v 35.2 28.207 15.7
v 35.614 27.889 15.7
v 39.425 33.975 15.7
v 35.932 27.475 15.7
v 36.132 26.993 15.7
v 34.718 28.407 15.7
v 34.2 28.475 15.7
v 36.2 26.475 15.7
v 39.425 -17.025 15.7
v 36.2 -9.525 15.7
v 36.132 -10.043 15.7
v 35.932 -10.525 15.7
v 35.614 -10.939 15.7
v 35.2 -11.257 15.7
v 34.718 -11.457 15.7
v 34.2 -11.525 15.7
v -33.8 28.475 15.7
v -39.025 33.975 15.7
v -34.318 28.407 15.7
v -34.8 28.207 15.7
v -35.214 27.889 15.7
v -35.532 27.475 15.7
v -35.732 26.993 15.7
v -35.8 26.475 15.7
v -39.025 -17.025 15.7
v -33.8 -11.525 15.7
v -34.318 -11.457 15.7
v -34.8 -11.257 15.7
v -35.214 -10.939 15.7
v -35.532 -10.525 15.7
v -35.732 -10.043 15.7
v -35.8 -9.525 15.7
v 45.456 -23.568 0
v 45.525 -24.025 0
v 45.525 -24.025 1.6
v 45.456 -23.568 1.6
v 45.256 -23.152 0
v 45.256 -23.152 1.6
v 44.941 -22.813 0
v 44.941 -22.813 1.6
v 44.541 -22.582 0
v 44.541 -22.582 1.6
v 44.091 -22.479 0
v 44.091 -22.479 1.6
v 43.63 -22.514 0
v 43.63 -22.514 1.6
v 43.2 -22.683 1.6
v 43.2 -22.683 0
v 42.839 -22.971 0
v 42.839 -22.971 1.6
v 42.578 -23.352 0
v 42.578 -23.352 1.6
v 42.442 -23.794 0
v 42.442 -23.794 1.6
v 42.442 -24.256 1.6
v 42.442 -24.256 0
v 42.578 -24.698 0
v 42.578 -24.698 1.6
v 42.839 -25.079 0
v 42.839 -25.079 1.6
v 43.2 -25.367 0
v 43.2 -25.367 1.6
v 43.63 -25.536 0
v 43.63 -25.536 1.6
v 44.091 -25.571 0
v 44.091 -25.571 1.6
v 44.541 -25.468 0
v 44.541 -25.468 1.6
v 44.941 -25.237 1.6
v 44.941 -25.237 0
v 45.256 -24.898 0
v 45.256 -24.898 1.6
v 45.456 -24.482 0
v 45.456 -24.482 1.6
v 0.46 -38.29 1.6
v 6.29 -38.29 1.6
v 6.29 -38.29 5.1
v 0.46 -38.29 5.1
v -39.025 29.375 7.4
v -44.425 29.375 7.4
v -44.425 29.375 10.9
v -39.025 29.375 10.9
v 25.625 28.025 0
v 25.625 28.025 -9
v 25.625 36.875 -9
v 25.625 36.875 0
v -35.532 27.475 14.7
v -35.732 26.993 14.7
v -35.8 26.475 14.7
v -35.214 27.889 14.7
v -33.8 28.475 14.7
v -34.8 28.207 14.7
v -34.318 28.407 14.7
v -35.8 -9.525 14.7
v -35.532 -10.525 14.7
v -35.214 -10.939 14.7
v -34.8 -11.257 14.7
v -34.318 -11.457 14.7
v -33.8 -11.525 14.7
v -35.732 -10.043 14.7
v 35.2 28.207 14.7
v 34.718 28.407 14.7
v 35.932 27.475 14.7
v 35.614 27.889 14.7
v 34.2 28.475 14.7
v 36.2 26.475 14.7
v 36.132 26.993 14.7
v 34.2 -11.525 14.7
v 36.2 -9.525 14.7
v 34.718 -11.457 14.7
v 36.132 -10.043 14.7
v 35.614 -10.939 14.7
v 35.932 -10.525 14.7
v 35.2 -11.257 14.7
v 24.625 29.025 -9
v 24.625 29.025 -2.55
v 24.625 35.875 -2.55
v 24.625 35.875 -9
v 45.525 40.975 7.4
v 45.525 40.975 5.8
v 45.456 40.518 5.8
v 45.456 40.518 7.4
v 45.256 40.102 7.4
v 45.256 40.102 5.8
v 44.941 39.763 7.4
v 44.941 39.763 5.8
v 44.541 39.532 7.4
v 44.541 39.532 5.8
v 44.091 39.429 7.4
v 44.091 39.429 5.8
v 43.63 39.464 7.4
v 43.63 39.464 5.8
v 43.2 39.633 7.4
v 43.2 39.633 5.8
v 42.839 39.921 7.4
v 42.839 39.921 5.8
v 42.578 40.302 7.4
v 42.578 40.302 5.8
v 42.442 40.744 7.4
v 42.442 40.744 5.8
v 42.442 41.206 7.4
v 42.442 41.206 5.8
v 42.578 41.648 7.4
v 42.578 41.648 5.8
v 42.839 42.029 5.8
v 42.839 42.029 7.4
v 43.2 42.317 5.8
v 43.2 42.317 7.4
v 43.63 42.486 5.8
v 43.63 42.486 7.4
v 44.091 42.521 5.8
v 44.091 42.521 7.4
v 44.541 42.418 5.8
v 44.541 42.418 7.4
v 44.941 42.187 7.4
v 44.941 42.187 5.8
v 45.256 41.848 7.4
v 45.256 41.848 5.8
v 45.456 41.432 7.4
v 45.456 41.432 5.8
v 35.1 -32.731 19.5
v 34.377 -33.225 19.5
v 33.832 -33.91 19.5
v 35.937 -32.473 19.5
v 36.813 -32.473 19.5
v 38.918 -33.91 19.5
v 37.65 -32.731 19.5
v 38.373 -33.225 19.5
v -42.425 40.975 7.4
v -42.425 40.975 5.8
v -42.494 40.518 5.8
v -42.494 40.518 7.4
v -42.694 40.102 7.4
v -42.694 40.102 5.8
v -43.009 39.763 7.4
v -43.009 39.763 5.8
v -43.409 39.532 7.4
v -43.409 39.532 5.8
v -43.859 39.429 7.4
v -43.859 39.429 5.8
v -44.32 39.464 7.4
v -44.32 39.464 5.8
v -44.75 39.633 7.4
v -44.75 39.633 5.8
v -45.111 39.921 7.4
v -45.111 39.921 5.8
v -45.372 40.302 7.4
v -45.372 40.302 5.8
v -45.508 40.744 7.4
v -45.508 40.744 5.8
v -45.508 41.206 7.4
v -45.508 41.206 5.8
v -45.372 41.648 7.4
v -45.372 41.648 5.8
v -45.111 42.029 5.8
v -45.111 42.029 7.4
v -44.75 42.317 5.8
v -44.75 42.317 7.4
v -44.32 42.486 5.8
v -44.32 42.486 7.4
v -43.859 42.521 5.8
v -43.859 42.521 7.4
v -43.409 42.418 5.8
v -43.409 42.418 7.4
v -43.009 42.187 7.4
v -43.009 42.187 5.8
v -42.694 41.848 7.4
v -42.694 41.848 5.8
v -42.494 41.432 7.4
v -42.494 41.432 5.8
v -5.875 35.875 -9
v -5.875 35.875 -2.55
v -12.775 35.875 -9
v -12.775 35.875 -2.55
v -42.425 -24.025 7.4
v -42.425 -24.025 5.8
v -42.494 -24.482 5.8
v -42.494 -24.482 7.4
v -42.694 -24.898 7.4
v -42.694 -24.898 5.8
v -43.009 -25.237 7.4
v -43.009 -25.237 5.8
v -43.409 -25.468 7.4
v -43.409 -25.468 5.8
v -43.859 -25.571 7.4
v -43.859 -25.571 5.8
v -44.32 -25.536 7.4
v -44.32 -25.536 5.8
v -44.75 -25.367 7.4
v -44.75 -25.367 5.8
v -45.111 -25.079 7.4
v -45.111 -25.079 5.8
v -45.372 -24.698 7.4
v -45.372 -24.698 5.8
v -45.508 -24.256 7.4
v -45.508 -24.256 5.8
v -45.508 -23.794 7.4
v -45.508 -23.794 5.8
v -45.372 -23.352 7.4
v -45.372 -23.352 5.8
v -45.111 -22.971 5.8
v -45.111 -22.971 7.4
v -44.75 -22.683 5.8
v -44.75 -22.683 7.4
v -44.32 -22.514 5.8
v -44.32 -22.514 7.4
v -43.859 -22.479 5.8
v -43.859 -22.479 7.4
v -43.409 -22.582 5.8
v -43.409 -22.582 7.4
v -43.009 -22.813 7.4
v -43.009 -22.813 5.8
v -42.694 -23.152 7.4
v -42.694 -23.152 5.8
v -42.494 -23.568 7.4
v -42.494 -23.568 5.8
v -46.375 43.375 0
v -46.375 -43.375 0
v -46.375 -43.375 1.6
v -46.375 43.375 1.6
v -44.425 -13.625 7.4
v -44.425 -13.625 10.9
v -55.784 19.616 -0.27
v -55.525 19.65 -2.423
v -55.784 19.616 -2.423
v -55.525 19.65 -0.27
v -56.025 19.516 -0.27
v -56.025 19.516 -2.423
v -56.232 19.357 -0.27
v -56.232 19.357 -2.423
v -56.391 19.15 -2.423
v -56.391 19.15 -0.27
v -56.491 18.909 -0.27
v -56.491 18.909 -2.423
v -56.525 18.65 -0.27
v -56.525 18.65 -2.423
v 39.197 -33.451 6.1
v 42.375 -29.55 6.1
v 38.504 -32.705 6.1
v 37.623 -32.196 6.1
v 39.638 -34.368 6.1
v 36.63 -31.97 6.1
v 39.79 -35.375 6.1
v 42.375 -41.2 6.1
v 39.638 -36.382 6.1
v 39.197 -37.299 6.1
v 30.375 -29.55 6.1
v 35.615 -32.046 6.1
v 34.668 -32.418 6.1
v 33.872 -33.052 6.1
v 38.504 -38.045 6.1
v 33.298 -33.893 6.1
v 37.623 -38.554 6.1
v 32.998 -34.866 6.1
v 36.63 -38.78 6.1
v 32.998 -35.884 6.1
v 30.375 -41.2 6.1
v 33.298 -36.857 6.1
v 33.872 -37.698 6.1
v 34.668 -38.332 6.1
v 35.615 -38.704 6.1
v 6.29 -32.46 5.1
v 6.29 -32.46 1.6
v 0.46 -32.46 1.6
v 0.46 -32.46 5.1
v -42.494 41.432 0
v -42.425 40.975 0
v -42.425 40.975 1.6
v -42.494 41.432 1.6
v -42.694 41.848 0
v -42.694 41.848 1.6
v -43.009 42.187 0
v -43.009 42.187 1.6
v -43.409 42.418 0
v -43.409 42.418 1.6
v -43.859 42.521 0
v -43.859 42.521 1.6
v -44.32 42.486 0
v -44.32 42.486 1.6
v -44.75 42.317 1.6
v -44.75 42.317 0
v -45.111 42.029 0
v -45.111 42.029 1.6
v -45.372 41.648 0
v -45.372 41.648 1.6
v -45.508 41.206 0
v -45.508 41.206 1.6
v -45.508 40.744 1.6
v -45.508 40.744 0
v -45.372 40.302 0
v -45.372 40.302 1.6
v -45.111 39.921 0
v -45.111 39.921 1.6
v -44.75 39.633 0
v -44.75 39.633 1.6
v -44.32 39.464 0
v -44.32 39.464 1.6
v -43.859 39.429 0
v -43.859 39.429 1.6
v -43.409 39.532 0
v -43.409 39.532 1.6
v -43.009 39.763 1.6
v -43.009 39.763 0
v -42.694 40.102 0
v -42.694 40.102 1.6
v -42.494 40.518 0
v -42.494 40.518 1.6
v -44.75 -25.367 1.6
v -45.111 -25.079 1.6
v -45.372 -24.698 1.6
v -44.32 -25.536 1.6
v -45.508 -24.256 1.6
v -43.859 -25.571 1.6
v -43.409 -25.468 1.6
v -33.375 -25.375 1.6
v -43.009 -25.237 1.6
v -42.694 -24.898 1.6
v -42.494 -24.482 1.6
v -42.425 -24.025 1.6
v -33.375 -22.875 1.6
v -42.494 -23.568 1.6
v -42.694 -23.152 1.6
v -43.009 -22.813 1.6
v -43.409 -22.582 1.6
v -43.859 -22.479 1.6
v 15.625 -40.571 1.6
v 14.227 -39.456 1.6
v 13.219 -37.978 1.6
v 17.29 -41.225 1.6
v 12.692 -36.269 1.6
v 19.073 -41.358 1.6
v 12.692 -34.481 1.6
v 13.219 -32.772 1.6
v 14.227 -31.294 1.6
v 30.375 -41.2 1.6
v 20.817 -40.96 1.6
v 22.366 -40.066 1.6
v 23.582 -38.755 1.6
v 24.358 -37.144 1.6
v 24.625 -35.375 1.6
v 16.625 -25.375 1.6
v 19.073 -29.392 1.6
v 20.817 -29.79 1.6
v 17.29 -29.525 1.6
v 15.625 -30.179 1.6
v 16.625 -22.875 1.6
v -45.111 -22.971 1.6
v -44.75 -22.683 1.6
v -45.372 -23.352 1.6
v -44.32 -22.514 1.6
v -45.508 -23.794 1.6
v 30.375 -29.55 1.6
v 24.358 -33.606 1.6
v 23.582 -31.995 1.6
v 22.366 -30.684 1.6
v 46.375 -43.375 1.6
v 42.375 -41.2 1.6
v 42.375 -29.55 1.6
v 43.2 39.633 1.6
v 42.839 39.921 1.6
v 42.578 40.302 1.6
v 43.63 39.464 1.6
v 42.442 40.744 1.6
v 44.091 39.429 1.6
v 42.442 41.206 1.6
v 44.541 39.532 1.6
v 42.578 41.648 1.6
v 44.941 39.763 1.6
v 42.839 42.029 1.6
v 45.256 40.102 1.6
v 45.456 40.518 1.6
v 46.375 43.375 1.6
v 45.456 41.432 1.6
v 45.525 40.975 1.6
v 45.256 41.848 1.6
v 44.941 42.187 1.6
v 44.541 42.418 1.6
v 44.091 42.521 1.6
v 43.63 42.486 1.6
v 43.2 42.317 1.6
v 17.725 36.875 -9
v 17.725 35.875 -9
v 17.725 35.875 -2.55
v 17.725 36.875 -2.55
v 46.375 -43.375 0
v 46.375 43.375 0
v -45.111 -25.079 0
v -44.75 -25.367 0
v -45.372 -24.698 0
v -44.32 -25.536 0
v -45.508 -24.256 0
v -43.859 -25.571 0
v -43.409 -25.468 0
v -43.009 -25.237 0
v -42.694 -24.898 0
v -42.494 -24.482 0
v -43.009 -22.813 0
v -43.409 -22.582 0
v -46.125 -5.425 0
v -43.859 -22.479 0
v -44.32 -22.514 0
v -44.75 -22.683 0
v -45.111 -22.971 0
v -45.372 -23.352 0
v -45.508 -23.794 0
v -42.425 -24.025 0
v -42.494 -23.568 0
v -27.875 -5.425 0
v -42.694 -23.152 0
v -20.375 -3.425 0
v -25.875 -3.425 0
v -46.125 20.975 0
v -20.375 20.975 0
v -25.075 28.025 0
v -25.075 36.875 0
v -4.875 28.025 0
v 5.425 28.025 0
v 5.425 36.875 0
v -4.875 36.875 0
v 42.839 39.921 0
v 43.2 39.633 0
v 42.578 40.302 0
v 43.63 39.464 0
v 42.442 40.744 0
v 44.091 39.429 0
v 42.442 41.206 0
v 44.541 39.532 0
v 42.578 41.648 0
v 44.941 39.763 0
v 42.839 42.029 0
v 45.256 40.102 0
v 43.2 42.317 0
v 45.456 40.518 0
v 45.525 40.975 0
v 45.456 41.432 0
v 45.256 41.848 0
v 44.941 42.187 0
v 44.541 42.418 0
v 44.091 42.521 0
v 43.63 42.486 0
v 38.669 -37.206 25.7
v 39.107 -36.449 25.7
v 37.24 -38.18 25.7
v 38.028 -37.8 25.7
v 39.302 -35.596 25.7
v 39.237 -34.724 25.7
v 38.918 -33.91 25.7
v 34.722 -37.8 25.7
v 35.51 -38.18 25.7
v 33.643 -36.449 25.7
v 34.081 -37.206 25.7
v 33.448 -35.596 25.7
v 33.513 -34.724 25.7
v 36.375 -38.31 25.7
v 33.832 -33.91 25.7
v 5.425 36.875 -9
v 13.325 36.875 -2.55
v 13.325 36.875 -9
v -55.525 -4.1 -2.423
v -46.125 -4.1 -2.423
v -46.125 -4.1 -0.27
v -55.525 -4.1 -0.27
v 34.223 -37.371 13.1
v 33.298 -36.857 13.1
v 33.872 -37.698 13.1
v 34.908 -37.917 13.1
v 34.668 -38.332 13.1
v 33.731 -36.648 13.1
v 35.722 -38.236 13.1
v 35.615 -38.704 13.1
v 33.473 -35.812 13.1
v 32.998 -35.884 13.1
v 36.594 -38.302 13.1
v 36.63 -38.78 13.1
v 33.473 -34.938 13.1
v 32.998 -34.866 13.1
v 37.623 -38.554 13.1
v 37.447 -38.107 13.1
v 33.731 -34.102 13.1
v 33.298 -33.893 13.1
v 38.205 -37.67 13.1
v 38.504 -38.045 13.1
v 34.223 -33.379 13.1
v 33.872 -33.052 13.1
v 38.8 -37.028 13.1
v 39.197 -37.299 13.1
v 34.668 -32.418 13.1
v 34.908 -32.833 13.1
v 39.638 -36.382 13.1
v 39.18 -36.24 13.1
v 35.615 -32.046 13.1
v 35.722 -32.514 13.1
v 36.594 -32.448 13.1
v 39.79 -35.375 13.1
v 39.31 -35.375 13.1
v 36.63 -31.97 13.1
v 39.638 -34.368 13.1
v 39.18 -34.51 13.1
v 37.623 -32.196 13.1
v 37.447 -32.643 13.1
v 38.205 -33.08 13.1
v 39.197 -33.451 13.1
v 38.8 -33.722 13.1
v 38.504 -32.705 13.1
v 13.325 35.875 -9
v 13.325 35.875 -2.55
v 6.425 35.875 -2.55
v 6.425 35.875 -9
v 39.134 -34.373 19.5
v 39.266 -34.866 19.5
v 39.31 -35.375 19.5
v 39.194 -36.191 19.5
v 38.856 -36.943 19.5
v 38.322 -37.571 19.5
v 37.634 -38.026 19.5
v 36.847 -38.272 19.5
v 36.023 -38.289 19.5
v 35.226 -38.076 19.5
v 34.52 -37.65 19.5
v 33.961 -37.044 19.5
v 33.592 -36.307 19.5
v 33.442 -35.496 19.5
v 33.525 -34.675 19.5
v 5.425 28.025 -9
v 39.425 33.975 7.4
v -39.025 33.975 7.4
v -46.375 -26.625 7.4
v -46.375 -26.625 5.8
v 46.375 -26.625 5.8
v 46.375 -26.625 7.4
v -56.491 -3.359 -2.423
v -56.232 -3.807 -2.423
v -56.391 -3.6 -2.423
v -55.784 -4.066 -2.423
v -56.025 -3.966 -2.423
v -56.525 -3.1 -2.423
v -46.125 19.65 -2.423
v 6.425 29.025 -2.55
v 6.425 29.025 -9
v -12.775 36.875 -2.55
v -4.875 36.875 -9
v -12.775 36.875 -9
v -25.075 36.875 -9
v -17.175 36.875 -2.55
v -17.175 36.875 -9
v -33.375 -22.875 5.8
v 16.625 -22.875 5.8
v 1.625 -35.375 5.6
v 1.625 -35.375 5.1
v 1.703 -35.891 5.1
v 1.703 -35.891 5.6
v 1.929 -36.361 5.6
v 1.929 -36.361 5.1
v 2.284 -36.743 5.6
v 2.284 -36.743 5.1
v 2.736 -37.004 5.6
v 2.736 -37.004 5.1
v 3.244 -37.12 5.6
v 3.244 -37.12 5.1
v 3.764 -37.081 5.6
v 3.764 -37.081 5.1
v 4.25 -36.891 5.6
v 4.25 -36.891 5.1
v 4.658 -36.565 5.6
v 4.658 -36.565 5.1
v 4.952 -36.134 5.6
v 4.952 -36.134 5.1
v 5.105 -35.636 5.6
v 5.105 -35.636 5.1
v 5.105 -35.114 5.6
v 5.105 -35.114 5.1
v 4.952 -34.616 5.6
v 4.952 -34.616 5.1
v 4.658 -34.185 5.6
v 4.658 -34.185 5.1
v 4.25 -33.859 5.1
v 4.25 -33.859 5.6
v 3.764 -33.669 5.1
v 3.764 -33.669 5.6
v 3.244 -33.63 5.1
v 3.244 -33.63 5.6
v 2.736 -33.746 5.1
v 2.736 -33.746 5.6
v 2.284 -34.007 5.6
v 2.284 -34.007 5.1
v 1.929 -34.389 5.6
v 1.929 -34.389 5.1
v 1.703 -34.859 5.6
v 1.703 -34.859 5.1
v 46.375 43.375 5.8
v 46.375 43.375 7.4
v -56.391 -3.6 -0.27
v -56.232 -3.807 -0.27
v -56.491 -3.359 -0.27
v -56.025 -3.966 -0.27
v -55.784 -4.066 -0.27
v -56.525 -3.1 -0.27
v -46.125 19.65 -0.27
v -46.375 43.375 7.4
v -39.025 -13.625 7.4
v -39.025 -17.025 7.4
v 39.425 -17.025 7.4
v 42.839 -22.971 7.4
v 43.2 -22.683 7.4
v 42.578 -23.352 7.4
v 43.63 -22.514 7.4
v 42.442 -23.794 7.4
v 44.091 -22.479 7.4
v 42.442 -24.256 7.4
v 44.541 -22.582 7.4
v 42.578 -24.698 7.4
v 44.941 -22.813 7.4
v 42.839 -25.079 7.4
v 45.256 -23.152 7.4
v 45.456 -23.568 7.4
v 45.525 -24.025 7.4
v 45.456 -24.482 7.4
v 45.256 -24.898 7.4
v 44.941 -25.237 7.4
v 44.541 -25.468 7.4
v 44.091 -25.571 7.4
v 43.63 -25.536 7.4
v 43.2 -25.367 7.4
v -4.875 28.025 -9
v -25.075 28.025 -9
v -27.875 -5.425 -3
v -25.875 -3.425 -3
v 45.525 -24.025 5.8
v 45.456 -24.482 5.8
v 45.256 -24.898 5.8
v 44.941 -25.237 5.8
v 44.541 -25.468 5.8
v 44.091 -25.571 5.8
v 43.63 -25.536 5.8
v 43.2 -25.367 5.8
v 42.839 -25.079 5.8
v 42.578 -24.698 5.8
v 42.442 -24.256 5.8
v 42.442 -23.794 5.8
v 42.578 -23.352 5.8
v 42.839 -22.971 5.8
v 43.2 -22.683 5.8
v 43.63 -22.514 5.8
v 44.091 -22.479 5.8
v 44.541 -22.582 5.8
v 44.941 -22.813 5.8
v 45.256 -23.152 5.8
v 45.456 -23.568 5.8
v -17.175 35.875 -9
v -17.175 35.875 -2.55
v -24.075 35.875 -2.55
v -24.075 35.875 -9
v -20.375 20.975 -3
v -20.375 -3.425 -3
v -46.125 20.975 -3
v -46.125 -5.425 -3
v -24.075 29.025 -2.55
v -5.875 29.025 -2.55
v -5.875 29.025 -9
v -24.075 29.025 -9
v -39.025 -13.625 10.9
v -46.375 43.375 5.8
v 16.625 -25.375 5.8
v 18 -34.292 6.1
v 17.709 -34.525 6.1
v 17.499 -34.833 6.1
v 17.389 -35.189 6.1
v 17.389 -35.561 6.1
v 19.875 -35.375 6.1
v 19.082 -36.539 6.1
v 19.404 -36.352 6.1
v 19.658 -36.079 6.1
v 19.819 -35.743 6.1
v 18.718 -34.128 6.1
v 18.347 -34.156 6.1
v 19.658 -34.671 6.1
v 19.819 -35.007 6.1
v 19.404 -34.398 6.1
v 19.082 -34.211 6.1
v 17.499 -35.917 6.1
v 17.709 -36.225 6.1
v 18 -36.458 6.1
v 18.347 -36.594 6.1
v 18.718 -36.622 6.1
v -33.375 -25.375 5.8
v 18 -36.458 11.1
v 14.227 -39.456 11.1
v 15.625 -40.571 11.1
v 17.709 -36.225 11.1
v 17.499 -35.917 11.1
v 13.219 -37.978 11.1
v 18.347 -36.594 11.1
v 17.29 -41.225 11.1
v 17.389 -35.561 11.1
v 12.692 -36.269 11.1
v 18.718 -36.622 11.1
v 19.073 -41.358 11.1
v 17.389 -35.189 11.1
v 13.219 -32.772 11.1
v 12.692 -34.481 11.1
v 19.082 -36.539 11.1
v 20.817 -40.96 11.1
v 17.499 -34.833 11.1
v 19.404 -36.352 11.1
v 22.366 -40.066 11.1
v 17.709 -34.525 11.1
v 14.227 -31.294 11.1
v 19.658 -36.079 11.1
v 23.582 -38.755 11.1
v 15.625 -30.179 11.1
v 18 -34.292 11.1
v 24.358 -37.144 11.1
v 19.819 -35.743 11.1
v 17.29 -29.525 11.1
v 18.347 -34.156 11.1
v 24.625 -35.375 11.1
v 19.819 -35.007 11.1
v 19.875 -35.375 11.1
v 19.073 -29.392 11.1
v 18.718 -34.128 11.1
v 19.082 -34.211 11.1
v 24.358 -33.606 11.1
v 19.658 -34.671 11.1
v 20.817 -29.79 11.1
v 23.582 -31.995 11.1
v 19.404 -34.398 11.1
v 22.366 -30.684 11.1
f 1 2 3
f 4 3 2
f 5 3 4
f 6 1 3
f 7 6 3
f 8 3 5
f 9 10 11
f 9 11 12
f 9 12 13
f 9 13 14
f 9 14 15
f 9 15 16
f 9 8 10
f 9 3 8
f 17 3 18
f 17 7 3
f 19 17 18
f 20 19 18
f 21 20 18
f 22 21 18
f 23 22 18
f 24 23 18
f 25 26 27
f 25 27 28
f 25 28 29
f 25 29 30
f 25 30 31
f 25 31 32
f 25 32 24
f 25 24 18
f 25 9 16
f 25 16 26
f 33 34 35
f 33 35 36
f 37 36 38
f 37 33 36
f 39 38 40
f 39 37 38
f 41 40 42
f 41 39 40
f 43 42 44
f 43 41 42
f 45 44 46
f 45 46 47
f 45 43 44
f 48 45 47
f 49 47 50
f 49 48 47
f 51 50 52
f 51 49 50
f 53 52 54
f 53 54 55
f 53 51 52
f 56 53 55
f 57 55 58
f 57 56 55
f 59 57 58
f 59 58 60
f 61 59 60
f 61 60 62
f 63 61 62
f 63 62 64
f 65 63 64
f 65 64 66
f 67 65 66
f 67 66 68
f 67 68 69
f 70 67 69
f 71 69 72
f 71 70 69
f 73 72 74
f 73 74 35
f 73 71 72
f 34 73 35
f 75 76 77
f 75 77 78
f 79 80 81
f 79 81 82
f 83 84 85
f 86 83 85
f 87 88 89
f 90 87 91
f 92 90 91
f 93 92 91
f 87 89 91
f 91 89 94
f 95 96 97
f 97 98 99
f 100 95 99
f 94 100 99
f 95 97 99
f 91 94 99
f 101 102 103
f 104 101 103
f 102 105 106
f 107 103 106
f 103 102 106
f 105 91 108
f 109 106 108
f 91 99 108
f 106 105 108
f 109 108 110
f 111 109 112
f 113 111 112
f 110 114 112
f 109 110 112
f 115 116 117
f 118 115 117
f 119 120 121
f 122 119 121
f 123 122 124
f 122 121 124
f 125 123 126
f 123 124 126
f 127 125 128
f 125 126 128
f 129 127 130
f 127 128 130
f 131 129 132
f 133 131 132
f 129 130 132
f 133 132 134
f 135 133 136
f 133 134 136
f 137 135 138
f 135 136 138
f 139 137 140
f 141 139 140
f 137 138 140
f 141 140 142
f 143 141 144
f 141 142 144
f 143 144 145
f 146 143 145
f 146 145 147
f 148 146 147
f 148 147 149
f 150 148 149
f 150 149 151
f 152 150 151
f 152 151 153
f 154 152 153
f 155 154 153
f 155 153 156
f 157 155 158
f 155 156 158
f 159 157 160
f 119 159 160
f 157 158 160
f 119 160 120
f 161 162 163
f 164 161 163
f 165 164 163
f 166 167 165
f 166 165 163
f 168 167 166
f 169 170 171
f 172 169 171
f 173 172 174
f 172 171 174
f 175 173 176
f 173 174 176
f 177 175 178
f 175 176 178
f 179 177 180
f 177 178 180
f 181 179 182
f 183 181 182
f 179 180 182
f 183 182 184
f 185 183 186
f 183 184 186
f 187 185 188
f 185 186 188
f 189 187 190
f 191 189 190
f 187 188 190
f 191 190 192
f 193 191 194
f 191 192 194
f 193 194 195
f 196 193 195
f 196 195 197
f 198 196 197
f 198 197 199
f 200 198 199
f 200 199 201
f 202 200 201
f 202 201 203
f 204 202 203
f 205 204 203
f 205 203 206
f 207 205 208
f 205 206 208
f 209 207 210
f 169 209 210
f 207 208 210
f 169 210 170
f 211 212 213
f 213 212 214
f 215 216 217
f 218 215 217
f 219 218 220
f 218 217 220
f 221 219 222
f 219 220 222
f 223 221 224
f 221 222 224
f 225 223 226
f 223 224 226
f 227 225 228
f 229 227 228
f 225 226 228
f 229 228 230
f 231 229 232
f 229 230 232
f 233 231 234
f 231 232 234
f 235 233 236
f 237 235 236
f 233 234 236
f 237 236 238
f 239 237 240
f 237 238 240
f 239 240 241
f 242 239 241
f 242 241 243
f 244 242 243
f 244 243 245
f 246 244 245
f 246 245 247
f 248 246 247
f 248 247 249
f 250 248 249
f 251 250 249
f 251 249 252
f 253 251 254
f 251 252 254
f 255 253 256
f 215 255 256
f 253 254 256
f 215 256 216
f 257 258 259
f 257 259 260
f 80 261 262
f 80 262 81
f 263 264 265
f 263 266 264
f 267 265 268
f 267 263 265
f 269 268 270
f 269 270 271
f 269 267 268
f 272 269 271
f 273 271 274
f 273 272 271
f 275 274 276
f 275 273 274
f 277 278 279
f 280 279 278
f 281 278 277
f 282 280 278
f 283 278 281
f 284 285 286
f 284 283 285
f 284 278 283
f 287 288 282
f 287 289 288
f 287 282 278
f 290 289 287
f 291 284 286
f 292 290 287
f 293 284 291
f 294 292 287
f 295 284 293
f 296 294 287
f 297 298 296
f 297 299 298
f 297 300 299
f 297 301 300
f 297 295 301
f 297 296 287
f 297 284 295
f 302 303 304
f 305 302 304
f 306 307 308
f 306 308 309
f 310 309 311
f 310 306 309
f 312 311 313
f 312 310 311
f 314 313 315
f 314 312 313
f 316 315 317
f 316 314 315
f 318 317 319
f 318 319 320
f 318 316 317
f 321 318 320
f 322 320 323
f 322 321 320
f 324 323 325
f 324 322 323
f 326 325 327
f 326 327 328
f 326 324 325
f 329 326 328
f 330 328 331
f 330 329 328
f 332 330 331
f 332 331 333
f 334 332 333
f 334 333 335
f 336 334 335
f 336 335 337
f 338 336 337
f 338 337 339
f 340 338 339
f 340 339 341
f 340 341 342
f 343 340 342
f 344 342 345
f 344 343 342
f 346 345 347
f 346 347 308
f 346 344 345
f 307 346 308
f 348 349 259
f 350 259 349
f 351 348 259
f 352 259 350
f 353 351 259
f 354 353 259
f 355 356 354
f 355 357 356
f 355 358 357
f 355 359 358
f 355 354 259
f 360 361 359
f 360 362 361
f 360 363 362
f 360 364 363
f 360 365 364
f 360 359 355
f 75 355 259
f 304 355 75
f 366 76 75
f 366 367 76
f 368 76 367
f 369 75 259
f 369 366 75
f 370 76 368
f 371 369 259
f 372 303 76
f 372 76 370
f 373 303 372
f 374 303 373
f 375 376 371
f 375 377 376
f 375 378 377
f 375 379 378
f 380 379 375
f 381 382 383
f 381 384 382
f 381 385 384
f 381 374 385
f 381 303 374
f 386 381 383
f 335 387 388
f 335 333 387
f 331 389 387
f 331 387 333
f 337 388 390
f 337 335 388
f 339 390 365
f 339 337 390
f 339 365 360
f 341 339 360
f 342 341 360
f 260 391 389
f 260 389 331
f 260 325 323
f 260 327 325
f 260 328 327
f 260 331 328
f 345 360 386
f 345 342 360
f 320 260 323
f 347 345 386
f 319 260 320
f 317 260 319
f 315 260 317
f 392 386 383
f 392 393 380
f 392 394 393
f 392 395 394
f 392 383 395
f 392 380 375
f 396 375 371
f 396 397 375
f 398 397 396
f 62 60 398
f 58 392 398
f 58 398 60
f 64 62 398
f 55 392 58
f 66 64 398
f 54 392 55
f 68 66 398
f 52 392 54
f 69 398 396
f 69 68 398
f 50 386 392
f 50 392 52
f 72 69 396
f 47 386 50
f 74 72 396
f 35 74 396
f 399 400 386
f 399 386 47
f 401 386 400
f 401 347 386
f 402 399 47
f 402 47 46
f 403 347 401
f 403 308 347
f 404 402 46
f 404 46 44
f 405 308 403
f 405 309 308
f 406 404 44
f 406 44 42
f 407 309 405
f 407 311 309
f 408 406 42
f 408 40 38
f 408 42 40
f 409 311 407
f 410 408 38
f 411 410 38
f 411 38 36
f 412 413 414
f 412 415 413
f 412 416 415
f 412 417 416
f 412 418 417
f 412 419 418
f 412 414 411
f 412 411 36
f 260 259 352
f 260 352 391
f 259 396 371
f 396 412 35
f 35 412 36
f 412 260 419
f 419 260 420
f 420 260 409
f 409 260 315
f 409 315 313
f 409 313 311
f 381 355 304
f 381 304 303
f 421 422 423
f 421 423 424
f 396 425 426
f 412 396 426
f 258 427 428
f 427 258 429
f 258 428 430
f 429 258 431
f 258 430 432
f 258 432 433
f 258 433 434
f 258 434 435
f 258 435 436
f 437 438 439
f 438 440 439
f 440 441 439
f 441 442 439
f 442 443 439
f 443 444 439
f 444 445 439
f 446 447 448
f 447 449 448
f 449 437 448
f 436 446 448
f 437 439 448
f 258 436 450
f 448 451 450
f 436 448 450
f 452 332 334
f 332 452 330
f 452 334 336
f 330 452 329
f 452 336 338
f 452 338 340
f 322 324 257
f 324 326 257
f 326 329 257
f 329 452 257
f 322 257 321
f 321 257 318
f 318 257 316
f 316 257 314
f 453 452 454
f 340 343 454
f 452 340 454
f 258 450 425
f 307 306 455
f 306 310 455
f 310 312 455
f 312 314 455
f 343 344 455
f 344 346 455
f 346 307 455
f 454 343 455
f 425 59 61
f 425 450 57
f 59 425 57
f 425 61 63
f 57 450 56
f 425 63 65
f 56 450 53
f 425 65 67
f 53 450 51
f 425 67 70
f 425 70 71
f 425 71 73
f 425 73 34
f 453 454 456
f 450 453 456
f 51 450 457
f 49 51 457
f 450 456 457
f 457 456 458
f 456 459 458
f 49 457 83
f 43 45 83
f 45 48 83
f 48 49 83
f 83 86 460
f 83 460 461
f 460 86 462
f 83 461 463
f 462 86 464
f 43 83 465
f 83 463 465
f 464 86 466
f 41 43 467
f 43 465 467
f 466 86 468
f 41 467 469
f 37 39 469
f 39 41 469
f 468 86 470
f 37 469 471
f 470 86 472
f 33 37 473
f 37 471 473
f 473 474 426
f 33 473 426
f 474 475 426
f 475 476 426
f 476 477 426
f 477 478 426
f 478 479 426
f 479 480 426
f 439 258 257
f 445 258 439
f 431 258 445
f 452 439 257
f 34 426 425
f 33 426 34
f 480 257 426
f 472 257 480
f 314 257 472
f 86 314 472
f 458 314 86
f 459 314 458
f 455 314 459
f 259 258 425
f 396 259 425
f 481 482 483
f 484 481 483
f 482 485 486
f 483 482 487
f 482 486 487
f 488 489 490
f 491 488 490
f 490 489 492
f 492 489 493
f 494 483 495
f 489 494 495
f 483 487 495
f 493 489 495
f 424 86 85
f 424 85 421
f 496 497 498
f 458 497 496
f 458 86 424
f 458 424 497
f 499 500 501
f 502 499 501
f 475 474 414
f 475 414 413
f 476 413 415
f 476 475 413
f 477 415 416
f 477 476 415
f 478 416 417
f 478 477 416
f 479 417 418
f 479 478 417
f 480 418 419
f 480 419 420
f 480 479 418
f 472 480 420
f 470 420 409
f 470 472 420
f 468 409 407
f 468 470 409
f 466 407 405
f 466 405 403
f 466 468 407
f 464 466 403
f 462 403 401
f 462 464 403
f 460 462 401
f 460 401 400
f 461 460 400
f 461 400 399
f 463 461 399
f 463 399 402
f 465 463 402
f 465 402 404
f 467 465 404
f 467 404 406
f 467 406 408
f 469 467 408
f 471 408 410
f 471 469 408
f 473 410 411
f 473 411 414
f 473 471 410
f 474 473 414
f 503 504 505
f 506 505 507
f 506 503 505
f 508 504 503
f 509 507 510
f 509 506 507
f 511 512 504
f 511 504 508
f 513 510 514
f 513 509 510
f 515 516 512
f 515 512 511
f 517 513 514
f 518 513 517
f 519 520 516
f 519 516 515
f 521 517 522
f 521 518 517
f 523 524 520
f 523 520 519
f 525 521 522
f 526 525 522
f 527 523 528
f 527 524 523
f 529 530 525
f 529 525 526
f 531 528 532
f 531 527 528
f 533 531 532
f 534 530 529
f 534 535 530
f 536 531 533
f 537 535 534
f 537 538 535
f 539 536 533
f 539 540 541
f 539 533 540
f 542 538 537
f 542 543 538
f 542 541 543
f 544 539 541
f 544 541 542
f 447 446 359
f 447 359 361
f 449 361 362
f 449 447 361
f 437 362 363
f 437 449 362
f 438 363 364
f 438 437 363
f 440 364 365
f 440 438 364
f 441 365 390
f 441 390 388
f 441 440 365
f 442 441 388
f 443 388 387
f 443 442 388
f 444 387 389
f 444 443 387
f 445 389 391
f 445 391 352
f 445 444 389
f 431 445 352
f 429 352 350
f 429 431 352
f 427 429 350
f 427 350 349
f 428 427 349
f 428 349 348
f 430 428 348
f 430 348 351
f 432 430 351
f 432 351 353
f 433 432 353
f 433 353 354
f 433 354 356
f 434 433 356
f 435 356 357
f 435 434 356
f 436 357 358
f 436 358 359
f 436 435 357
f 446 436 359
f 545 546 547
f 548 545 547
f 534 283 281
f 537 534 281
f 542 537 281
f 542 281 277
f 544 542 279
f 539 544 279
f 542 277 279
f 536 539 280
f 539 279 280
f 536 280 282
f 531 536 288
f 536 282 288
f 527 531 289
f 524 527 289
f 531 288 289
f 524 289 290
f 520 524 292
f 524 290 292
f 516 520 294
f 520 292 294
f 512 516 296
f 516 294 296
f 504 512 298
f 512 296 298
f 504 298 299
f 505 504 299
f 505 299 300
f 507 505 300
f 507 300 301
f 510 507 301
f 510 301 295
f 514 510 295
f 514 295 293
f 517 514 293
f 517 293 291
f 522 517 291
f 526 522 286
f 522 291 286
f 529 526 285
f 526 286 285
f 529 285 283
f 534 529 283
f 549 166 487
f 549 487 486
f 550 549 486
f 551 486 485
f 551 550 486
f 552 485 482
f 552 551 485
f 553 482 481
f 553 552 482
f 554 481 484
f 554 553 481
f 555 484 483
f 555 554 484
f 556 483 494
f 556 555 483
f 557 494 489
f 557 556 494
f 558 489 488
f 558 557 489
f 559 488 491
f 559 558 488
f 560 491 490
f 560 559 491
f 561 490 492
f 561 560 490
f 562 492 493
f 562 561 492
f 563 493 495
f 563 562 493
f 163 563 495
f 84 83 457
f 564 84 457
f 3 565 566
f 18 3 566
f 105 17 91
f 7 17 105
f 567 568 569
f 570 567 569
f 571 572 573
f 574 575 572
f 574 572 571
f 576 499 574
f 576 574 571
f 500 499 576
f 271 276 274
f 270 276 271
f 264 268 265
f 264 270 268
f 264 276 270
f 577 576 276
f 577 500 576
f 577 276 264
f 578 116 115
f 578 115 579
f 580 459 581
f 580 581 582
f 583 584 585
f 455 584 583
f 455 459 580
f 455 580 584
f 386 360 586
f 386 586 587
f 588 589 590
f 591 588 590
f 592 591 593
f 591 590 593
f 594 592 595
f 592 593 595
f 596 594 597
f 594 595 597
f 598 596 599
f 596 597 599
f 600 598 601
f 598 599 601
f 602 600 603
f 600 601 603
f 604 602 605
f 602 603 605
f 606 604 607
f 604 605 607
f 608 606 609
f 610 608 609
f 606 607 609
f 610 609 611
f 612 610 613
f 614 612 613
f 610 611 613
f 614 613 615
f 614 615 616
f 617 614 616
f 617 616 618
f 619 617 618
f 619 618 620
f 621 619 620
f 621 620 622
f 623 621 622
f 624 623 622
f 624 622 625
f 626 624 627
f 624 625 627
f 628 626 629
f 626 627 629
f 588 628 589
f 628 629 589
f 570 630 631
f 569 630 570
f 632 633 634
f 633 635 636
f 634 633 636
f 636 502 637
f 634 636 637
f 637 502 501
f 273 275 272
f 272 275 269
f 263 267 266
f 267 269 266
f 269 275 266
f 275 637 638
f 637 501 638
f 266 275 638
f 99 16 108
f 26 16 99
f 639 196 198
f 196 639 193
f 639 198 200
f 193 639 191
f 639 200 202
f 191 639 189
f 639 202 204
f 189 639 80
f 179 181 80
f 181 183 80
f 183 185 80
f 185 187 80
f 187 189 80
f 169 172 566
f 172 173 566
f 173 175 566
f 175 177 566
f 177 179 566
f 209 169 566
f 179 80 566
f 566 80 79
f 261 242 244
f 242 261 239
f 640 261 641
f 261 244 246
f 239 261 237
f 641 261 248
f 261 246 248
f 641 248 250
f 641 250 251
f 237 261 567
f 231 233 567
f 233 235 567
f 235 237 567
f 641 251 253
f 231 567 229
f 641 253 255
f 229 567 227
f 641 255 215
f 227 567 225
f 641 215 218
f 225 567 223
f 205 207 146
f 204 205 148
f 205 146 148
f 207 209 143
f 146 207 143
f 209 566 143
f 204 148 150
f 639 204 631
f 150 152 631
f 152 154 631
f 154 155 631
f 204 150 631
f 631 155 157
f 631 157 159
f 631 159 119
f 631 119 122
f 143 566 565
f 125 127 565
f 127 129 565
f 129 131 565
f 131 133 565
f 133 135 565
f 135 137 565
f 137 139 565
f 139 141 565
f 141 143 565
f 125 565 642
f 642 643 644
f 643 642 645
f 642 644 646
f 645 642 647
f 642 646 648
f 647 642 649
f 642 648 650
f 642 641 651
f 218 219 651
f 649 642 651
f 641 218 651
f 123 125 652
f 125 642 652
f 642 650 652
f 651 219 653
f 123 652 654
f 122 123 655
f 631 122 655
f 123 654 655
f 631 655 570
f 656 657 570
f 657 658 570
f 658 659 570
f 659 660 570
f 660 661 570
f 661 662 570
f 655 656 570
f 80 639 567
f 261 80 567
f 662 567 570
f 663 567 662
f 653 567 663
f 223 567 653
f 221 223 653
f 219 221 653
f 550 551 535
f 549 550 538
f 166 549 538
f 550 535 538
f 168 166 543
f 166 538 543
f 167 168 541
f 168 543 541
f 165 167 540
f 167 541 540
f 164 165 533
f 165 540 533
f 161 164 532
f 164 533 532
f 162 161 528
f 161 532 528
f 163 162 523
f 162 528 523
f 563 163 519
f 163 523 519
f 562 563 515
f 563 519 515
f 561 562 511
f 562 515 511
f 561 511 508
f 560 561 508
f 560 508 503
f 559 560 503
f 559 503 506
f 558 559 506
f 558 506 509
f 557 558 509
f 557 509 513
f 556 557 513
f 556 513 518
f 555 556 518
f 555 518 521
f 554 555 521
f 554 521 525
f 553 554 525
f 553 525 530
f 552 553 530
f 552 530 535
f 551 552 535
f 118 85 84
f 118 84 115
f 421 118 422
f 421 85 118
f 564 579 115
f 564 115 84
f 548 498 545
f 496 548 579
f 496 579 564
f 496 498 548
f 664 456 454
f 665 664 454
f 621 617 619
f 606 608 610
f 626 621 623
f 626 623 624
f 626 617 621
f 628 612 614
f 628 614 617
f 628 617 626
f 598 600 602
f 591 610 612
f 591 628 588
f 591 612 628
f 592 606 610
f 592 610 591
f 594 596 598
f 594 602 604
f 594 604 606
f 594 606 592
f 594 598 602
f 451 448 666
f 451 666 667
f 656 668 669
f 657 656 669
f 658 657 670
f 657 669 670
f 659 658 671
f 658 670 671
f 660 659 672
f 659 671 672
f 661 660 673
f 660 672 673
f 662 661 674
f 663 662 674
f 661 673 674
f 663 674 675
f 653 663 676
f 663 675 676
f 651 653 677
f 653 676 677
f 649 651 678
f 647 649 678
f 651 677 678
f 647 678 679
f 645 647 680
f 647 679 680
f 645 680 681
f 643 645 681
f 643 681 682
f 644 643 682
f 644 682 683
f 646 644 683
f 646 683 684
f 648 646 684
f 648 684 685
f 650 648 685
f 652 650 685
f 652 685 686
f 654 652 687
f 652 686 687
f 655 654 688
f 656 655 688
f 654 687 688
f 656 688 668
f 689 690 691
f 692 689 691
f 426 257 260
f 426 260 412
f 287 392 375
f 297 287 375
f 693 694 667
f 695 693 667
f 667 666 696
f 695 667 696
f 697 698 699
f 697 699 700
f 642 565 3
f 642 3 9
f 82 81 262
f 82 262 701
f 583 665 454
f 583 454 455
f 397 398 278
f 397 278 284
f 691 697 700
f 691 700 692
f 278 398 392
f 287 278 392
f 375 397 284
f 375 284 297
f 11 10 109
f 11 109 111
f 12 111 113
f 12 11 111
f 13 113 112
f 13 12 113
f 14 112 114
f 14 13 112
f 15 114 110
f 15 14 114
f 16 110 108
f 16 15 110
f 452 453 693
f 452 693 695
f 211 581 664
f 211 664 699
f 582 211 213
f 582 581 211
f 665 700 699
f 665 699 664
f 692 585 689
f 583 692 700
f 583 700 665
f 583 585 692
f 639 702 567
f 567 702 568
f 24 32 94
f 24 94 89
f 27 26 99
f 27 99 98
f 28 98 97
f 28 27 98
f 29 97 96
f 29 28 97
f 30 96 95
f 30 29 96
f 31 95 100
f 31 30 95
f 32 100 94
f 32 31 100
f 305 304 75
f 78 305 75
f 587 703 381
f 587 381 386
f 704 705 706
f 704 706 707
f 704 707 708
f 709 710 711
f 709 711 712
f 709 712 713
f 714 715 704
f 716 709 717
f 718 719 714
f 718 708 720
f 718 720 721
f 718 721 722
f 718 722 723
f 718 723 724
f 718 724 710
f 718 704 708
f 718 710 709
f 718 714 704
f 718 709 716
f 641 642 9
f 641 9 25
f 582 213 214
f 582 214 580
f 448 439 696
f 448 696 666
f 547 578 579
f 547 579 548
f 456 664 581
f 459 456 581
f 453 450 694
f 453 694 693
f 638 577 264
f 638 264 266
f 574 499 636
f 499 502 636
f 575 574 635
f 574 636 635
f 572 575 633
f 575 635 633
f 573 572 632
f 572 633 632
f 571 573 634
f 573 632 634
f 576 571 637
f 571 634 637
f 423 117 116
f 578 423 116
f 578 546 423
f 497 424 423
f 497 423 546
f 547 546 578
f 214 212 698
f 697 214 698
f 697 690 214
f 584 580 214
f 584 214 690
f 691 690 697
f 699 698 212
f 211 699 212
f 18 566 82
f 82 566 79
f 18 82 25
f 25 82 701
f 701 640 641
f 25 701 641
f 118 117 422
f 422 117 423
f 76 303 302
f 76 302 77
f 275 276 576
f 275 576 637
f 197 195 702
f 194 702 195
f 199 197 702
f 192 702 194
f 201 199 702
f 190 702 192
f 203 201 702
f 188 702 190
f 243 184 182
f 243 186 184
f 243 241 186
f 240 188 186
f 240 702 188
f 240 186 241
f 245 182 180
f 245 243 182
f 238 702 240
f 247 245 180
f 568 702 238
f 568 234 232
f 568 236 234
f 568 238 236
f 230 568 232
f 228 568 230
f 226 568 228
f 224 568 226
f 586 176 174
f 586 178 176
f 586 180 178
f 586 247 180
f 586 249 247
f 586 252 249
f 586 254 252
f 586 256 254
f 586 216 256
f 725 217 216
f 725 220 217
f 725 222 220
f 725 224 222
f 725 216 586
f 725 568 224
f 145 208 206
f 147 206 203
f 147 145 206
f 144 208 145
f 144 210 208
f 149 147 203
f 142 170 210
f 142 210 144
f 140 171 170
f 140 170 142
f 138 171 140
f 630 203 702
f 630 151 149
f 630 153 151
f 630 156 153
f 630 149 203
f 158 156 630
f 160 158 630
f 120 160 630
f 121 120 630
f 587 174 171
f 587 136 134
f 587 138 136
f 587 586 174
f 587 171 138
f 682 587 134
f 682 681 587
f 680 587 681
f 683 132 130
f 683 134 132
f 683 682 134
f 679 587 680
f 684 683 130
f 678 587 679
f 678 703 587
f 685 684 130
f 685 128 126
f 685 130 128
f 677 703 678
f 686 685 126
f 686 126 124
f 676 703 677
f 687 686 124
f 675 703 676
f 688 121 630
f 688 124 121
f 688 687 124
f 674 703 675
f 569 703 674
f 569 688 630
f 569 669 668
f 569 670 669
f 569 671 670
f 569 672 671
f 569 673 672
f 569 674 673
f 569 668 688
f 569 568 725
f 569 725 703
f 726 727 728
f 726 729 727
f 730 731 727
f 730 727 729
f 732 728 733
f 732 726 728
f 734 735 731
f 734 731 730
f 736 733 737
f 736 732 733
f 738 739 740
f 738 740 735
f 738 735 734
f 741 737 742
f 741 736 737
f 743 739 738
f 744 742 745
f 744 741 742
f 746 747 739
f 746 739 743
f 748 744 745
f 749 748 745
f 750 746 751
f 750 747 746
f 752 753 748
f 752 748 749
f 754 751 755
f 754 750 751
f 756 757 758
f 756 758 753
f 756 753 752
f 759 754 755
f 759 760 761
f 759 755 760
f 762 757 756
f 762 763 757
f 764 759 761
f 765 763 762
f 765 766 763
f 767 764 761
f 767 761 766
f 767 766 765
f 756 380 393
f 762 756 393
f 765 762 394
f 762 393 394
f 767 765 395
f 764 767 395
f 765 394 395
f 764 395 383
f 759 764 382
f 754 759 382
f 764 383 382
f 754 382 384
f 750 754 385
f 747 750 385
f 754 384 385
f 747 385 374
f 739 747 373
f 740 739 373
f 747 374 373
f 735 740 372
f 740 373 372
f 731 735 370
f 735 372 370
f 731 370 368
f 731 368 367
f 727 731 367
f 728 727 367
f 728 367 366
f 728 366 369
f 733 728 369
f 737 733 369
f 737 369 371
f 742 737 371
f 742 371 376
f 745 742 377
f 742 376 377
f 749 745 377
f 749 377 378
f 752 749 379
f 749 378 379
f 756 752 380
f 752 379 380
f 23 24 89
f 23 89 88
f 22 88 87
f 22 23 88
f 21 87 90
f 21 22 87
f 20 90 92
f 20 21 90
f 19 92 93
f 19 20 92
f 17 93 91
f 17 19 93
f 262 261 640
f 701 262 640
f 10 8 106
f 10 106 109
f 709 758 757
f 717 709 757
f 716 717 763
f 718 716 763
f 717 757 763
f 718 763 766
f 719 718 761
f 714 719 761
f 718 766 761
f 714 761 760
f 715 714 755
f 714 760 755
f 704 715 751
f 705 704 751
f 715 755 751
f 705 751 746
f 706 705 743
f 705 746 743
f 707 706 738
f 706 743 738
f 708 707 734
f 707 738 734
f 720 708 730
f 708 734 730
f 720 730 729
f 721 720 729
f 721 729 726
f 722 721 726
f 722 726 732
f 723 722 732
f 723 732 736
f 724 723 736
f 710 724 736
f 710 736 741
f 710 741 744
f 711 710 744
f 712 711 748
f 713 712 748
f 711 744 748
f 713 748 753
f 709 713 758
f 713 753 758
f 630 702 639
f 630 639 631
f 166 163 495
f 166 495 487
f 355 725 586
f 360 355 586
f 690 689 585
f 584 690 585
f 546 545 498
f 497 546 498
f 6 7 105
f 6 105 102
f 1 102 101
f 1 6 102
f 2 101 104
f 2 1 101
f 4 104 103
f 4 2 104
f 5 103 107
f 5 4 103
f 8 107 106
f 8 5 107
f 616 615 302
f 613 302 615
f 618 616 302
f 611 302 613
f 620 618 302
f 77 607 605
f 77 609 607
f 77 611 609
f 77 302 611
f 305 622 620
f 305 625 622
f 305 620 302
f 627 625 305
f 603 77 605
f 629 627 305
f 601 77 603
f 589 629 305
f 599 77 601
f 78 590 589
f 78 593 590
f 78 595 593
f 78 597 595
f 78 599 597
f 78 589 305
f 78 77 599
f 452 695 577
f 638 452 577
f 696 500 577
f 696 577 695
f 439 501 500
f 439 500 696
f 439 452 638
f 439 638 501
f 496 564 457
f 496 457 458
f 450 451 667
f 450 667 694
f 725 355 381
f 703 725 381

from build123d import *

# Parameters (mm, degrees)
SKETCH1_W                             = 92.75
SKETCH1_H                             = 86.75
SKETCH1_R                             = 1.55
BOSS_EXTRUDE1_FIRST_PCB_DEPTH         = 1.6
SKETCH2_R                             = 6
BOSS_EXTRUDE2_SPEAKER_DEPTH           = 9.5
SKETCH15_R                            = 1.25
CUT_EXTRUDE1_SPEAKER_HOLE_DEPTH       = 5
SKETCH3_W                             = 12
SKETCH3_H                             = 11.65
BOSS_EXTRUDE3_ROTARY_SWITCH_DEPTH     = 4.5
SKETCH4_W                             = 5.83
SKETCH4_H                             = 5.83
BOSS_EXTRUDE4_RESET_SWITCH_DEPTH      = 3.5
SKETCH5_R                             = 1.75
BOSS_EXTRUDE5_RESET_BUTTON_DEPTH      = 0.5
SKETCH16_R                            = 3.415
BOSS_EXTRUDE6_ROTARY_SWITCH_DEPTH     = 7
SKETCH17_R                            = 2.935
BOSS_EXTRUDE7_ROTARY_SWITCH_DEPTH     = 6.4
BOSS_EXTRUDE8_ROTARY_SWITCH_DEPTH     = 6.2
BOSS_EXTRUDE9_SD_CARD_SLOT_DEPTH      = 3
SKETCH19_W                            = 50
SKETCH19_H                            = 2.5
BOSS_EXTRUDE10_CONNECTOR_DEPTH        = 4.2
SKETCH11_W                            = 92.75
SKETCH11_H                            = 70
SKETCH11_R                            = 1.55
BOSS_EXTRUDE11_UPPER_PCB_DEPTH        = 1.6
SKETCH12_W                            = 78.45
SKETCH12_H                            = 51
BOSS_EXTRUDE12_LCD_DEPTH              = 8.3
SKETCH24_W                            = 5.4
SKETCH24_H                            = 43
BOSS_EXTRUDE13_LCD_BUMPOUT_DEPTH      = 3.5
CUT_EXTRUDE2_SCREEN_RECESS_DEPTH      = 1
SKETCH21_W                            = 20.2
SKETCH21_H                            = 8.85
SKETCH21_W_2                          = 18.2
SKETCH21_H_2                          = 6.85
BOSS_EXTRUDE14_CONNECTORS_DEPTH       = 9
SKETCH22_W                            = 18.2
SKETCH22_H                            = 6.85
BOSS_EXTRUDE15_CONNECTOR_RECESS_DEPTH = 2.55
SKETCH23_W                            = 4.4
SKETCH23_H                            = 1
CUT_EXTRUDE3_CONNECTOR_NOTCH_DEPTH    = 6.45
SKETCH20_W                            = 2.153
SKETCH20_H                            = 23.75
BOSS_EXTRUDE16_SD_CARD_DEPTH          = 10.4
FILLET1_SD_CARD_R                     = 1


with BuildPart() as part:
    # Sketch1 → Boss-Extrude1 - First PCB (new body)
    with BuildSketch(Plane.XY):
        Rectangle(SKETCH1_W, SKETCH1_H)
        with Locations((-43.975, 40.975)):
            Circle(SKETCH1_R, mode=Mode.SUBTRACT)
        with Locations((43.975, 40.975)):
            Circle(SKETCH1_R, mode=Mode.SUBTRACT)
        with Locations((43.975, -24.025)):
            Circle(SKETCH1_R, mode=Mode.SUBTRACT)
        with Locations((-43.975, -24.025)):
            Circle(SKETCH1_R, mode=Mode.SUBTRACT)
    extrude(amount=BOSS_EXTRUDE1_FIRST_PCB_DEPTH)

    # Sketch2 → Boss-Extrude2 - Speaker (add)
    with BuildSketch(Plane.XY.offset(1.6)):
        with Locations((18.625, -35.375)):
            Circle(SKETCH2_R)
    extrude(amount=BOSS_EXTRUDE2_SPEAKER_DEPTH)

    # Sketch15 → Cut-Extrude1 - Speaker Hole (cut)
    with BuildSketch(Plane.XY.offset(11.1)):
        with Locations((18.625, -35.375)):
            Circle(SKETCH15_R)
    extrude(amount=-CUT_EXTRUDE1_SPEAKER_HOLE_DEPTH, mode=Mode.SUBTRACT)

    # Sketch3 → Boss-Extrude3 - Rotary Switch (add)
    with BuildSketch(Plane(origin=(0, 0, 1.6), x_dir=(-1, 0, 0), z_dir=(0, 0, 1))):
        with Locations((-36.375, 35.375)):
            Rectangle(SKETCH3_W, SKETCH3_H)
    extrude(amount=BOSS_EXTRUDE3_ROTARY_SWITCH_DEPTH)

    # Sketch4 → Boss-Extrude4 - Reset Switch (add)
    with BuildSketch(Plane(origin=(0, 0, 1.6), x_dir=(-1, 0, 0), z_dir=(0, 0, 1))):
        with Locations((-3.375, 35.375)):
            Rectangle(SKETCH4_W, SKETCH4_H)
    extrude(amount=BOSS_EXTRUDE4_RESET_SWITCH_DEPTH)

    # Sketch5 → Boss-Extrude5 - Reset Button (add)
    with BuildSketch(Plane(origin=(0, 0, 5.1), x_dir=(-1, 0, 0), z_dir=(0, 0, 1))):
        with Locations((-3.375, 35.375)):
            Circle(SKETCH5_R)
    extrude(amount=BOSS_EXTRUDE5_RESET_BUTTON_DEPTH)

    # Sketch16 → Boss-Extrude6 - Rotary Switch (add)
    with BuildSketch(Plane.XY.offset(6.1)):
        with Locations((36.375, -35.375)):
            Circle(SKETCH16_R)
    extrude(amount=BOSS_EXTRUDE6_ROTARY_SWITCH_DEPTH)

    # Sketch17 → Boss-Extrude7 - Rotary Switch (add)
    with BuildSketch(Plane.XY.offset(13.1)):
        with Locations((36.375, -35.375)):
            Circle(SKETCH17_R)
    extrude(amount=BOSS_EXTRUDE7_ROTARY_SWITCH_DEPTH)

    # Sketch18 → Boss-Extrude8 - Rotary Switch (add)
    with BuildSketch(Plane.XY.offset(19.5)):
        with BuildLine():
            Line((33.831773703, -33.91), (38.918226297, -33.91))
            ThreePointArc((38.918226297, -33.91), (36.375, -38.31), (33.831773703, -33.91))
        make_face()
    extrude(amount=BOSS_EXTRUDE8_ROTARY_SWITCH_DEPTH)

    # Sketch9 → Boss-Extrude9 - SD Card Slot (add)
    with BuildSketch(Plane(origin=(0, 0, 0), x_dir=(1, 0, 0), z_dir=(0, 0, -1))):
        Polygon((-46.125, 5.425), (-27.875, 5.425), (-25.875, 3.425), (-20.375, 3.425), (-20.375, -20.975), (-46.125, -20.975), align=None)
    extrude(amount=BOSS_EXTRUDE9_SD_CARD_SLOT_DEPTH)

    # Sketch19 → Boss-Extrude10 - Connector (add)
    with BuildSketch(Plane.XY.offset(1.6)):
        with Locations((-8.375, -24.125)):
            Rectangle(SKETCH19_W, SKETCH19_H)
    extrude(amount=BOSS_EXTRUDE10_CONNECTOR_DEPTH)

    # Sketch11 → Boss-Extrude11 - Upper PCB (add)
    with BuildSketch(Plane(origin=(0, -2, 5.8), x_dir=(1, 0, 0), z_dir=(0, 0, -1))):
        with Locations((0, -10.375)):
            Rectangle(SKETCH11_W, SKETCH11_H)
        with Locations((-43.975, -42.975)):
            Circle(SKETCH11_R, mode=Mode.SUBTRACT)
        with Locations((-43.975, 22.025)):
            Circle(SKETCH11_R, mode=Mode.SUBTRACT)
        with Locations((43.975, -42.975)):
            Circle(SKETCH11_R, mode=Mode.SUBTRACT)
        with Locations((43.975, 22.025)):
            Circle(SKETCH11_R, mode=Mode.SUBTRACT)
    extrude(amount=-BOSS_EXTRUDE11_UPPER_PCB_DEPTH)

    # Sketch12 → Boss-Extrude12 - LCD (add)
    with BuildSketch(Plane(origin=(0, 0, 7.4), x_dir=(-1, 0, 0), z_dir=(0, 0, 1))):
        with Locations((-0.2, -8.475)):
            Rectangle(SKETCH12_W, SKETCH12_H)
    extrude(amount=BOSS_EXTRUDE12_LCD_DEPTH)

    # Sketch24 → Boss-Extrude13 - LCD Bumpout (add)
    with BuildSketch(Plane.XY.offset(7.4)):
        with Locations((-41.725, 7.875)):
            Rectangle(SKETCH24_W, SKETCH24_H)
    extrude(amount=BOSS_EXTRUDE13_LCD_BUMPOUT_DEPTH)

    # Sketch13 → Cut-Extrude2 - Screen Recess (cut)
    with BuildSketch(Plane(origin=(0, 0, 15.7), x_dir=(-1, 0, 0), z_dir=(0, 0, 1))):
        with BuildLine():
            Line((-34.2, 11.525), (33.8, 11.525))
            ThreePointArc((33.8, 11.525), (35.214213562, 10.939213562), (35.8, 9.525))
            Line((35.8, 9.525), (35.8, -26.475))
            ThreePointArc((35.8, -26.475), (35.214213562, -27.889213562), (33.8, -28.475))
            Line((33.8, -28.475), (-34.2, -28.475))
            ThreePointArc((-34.2, -28.475), (-35.614213562, -27.889213562), (-36.2, -26.475))
            Line((-36.2, -26.475), (-36.2, 9.525))
            ThreePointArc((-36.2, 9.525), (-35.614213562, 10.939213562), (-34.2, 11.525))
        make_face()
    extrude(amount=-CUT_EXTRUDE2_SCREEN_RECESS_DEPTH, mode=Mode.SUBTRACT)

    # Sketch21 → Boss-Extrude14 - Connectors (add)
    with BuildSketch(Plane(origin=(0, 0, 0), x_dir=(-1, 0, 0), z_dir=(0, 0, -1))):
        with Locations((-15.525, 32.45)):
            Rectangle(SKETCH21_W, SKETCH21_H)
        with Locations((-15.525, 32.45)):
            Rectangle(SKETCH21_W_2, SKETCH21_H_2, mode=Mode.SUBTRACT)
        with Locations((14.975, 32.45)):
            Rectangle(SKETCH21_W, SKETCH21_H)
        with Locations((14.975, 32.45)):
            Rectangle(SKETCH21_W_2, SKETCH21_H_2, mode=Mode.SUBTRACT)
    extrude(amount=BOSS_EXTRUDE14_CONNECTORS_DEPTH)

    # Sketch22 → Boss-Extrude15 - Connector Recess (add)
    with BuildSketch(Plane(origin=(0, 0, 0), x_dir=(-1, 0, 0), z_dir=(0, 0, -1))):
        with Locations((-15.525, 32.45)):
            Rectangle(SKETCH22_W, SKETCH22_H)
        with Locations((14.975, 32.45)):
            Rectangle(SKETCH22_W, SKETCH22_H)
    extrude(amount=BOSS_EXTRUDE15_CONNECTOR_RECESS_DEPTH)

    # Sketch23 → Cut-Extrude3 - Connector Notch (cut)
    with BuildSketch(Plane(origin=(0, 0, -9), x_dir=(-1, 0, 0), z_dir=(0, 0, -1))):
        with Locations((-15.525, 36.375)):
            Rectangle(SKETCH23_W, SKETCH23_H)
        with Locations((14.975, 36.375)):
            Rectangle(SKETCH23_W, SKETCH23_H)
    extrude(amount=-CUT_EXTRUDE3_CONNECTOR_NOTCH_DEPTH, mode=Mode.SUBTRACT)

    # Sketch20 → Boss-Extrude16 - SD Card (add)
    with BuildSketch(Plane.ZY.offset(46.125)):
        with Locations((-1.3465, 7.775)):
            Rectangle(SKETCH20_W, SKETCH20_H)
    extrude(amount=BOSS_EXTRUDE16_SD_CARD_DEPTH)

    # Fillet1 - SD Card
    fillet1_sd_card_edges = [part.edges().sort_by_distance(p)[0] for p in [
        (-56.525, -4.1, -1.3465),
        (-56.525, 19.65, -1.3465),
    ]]
    fillet(fillet1_sd_card_edges, radius=FILLET1_SD_CARD_R)


solid = part.part
